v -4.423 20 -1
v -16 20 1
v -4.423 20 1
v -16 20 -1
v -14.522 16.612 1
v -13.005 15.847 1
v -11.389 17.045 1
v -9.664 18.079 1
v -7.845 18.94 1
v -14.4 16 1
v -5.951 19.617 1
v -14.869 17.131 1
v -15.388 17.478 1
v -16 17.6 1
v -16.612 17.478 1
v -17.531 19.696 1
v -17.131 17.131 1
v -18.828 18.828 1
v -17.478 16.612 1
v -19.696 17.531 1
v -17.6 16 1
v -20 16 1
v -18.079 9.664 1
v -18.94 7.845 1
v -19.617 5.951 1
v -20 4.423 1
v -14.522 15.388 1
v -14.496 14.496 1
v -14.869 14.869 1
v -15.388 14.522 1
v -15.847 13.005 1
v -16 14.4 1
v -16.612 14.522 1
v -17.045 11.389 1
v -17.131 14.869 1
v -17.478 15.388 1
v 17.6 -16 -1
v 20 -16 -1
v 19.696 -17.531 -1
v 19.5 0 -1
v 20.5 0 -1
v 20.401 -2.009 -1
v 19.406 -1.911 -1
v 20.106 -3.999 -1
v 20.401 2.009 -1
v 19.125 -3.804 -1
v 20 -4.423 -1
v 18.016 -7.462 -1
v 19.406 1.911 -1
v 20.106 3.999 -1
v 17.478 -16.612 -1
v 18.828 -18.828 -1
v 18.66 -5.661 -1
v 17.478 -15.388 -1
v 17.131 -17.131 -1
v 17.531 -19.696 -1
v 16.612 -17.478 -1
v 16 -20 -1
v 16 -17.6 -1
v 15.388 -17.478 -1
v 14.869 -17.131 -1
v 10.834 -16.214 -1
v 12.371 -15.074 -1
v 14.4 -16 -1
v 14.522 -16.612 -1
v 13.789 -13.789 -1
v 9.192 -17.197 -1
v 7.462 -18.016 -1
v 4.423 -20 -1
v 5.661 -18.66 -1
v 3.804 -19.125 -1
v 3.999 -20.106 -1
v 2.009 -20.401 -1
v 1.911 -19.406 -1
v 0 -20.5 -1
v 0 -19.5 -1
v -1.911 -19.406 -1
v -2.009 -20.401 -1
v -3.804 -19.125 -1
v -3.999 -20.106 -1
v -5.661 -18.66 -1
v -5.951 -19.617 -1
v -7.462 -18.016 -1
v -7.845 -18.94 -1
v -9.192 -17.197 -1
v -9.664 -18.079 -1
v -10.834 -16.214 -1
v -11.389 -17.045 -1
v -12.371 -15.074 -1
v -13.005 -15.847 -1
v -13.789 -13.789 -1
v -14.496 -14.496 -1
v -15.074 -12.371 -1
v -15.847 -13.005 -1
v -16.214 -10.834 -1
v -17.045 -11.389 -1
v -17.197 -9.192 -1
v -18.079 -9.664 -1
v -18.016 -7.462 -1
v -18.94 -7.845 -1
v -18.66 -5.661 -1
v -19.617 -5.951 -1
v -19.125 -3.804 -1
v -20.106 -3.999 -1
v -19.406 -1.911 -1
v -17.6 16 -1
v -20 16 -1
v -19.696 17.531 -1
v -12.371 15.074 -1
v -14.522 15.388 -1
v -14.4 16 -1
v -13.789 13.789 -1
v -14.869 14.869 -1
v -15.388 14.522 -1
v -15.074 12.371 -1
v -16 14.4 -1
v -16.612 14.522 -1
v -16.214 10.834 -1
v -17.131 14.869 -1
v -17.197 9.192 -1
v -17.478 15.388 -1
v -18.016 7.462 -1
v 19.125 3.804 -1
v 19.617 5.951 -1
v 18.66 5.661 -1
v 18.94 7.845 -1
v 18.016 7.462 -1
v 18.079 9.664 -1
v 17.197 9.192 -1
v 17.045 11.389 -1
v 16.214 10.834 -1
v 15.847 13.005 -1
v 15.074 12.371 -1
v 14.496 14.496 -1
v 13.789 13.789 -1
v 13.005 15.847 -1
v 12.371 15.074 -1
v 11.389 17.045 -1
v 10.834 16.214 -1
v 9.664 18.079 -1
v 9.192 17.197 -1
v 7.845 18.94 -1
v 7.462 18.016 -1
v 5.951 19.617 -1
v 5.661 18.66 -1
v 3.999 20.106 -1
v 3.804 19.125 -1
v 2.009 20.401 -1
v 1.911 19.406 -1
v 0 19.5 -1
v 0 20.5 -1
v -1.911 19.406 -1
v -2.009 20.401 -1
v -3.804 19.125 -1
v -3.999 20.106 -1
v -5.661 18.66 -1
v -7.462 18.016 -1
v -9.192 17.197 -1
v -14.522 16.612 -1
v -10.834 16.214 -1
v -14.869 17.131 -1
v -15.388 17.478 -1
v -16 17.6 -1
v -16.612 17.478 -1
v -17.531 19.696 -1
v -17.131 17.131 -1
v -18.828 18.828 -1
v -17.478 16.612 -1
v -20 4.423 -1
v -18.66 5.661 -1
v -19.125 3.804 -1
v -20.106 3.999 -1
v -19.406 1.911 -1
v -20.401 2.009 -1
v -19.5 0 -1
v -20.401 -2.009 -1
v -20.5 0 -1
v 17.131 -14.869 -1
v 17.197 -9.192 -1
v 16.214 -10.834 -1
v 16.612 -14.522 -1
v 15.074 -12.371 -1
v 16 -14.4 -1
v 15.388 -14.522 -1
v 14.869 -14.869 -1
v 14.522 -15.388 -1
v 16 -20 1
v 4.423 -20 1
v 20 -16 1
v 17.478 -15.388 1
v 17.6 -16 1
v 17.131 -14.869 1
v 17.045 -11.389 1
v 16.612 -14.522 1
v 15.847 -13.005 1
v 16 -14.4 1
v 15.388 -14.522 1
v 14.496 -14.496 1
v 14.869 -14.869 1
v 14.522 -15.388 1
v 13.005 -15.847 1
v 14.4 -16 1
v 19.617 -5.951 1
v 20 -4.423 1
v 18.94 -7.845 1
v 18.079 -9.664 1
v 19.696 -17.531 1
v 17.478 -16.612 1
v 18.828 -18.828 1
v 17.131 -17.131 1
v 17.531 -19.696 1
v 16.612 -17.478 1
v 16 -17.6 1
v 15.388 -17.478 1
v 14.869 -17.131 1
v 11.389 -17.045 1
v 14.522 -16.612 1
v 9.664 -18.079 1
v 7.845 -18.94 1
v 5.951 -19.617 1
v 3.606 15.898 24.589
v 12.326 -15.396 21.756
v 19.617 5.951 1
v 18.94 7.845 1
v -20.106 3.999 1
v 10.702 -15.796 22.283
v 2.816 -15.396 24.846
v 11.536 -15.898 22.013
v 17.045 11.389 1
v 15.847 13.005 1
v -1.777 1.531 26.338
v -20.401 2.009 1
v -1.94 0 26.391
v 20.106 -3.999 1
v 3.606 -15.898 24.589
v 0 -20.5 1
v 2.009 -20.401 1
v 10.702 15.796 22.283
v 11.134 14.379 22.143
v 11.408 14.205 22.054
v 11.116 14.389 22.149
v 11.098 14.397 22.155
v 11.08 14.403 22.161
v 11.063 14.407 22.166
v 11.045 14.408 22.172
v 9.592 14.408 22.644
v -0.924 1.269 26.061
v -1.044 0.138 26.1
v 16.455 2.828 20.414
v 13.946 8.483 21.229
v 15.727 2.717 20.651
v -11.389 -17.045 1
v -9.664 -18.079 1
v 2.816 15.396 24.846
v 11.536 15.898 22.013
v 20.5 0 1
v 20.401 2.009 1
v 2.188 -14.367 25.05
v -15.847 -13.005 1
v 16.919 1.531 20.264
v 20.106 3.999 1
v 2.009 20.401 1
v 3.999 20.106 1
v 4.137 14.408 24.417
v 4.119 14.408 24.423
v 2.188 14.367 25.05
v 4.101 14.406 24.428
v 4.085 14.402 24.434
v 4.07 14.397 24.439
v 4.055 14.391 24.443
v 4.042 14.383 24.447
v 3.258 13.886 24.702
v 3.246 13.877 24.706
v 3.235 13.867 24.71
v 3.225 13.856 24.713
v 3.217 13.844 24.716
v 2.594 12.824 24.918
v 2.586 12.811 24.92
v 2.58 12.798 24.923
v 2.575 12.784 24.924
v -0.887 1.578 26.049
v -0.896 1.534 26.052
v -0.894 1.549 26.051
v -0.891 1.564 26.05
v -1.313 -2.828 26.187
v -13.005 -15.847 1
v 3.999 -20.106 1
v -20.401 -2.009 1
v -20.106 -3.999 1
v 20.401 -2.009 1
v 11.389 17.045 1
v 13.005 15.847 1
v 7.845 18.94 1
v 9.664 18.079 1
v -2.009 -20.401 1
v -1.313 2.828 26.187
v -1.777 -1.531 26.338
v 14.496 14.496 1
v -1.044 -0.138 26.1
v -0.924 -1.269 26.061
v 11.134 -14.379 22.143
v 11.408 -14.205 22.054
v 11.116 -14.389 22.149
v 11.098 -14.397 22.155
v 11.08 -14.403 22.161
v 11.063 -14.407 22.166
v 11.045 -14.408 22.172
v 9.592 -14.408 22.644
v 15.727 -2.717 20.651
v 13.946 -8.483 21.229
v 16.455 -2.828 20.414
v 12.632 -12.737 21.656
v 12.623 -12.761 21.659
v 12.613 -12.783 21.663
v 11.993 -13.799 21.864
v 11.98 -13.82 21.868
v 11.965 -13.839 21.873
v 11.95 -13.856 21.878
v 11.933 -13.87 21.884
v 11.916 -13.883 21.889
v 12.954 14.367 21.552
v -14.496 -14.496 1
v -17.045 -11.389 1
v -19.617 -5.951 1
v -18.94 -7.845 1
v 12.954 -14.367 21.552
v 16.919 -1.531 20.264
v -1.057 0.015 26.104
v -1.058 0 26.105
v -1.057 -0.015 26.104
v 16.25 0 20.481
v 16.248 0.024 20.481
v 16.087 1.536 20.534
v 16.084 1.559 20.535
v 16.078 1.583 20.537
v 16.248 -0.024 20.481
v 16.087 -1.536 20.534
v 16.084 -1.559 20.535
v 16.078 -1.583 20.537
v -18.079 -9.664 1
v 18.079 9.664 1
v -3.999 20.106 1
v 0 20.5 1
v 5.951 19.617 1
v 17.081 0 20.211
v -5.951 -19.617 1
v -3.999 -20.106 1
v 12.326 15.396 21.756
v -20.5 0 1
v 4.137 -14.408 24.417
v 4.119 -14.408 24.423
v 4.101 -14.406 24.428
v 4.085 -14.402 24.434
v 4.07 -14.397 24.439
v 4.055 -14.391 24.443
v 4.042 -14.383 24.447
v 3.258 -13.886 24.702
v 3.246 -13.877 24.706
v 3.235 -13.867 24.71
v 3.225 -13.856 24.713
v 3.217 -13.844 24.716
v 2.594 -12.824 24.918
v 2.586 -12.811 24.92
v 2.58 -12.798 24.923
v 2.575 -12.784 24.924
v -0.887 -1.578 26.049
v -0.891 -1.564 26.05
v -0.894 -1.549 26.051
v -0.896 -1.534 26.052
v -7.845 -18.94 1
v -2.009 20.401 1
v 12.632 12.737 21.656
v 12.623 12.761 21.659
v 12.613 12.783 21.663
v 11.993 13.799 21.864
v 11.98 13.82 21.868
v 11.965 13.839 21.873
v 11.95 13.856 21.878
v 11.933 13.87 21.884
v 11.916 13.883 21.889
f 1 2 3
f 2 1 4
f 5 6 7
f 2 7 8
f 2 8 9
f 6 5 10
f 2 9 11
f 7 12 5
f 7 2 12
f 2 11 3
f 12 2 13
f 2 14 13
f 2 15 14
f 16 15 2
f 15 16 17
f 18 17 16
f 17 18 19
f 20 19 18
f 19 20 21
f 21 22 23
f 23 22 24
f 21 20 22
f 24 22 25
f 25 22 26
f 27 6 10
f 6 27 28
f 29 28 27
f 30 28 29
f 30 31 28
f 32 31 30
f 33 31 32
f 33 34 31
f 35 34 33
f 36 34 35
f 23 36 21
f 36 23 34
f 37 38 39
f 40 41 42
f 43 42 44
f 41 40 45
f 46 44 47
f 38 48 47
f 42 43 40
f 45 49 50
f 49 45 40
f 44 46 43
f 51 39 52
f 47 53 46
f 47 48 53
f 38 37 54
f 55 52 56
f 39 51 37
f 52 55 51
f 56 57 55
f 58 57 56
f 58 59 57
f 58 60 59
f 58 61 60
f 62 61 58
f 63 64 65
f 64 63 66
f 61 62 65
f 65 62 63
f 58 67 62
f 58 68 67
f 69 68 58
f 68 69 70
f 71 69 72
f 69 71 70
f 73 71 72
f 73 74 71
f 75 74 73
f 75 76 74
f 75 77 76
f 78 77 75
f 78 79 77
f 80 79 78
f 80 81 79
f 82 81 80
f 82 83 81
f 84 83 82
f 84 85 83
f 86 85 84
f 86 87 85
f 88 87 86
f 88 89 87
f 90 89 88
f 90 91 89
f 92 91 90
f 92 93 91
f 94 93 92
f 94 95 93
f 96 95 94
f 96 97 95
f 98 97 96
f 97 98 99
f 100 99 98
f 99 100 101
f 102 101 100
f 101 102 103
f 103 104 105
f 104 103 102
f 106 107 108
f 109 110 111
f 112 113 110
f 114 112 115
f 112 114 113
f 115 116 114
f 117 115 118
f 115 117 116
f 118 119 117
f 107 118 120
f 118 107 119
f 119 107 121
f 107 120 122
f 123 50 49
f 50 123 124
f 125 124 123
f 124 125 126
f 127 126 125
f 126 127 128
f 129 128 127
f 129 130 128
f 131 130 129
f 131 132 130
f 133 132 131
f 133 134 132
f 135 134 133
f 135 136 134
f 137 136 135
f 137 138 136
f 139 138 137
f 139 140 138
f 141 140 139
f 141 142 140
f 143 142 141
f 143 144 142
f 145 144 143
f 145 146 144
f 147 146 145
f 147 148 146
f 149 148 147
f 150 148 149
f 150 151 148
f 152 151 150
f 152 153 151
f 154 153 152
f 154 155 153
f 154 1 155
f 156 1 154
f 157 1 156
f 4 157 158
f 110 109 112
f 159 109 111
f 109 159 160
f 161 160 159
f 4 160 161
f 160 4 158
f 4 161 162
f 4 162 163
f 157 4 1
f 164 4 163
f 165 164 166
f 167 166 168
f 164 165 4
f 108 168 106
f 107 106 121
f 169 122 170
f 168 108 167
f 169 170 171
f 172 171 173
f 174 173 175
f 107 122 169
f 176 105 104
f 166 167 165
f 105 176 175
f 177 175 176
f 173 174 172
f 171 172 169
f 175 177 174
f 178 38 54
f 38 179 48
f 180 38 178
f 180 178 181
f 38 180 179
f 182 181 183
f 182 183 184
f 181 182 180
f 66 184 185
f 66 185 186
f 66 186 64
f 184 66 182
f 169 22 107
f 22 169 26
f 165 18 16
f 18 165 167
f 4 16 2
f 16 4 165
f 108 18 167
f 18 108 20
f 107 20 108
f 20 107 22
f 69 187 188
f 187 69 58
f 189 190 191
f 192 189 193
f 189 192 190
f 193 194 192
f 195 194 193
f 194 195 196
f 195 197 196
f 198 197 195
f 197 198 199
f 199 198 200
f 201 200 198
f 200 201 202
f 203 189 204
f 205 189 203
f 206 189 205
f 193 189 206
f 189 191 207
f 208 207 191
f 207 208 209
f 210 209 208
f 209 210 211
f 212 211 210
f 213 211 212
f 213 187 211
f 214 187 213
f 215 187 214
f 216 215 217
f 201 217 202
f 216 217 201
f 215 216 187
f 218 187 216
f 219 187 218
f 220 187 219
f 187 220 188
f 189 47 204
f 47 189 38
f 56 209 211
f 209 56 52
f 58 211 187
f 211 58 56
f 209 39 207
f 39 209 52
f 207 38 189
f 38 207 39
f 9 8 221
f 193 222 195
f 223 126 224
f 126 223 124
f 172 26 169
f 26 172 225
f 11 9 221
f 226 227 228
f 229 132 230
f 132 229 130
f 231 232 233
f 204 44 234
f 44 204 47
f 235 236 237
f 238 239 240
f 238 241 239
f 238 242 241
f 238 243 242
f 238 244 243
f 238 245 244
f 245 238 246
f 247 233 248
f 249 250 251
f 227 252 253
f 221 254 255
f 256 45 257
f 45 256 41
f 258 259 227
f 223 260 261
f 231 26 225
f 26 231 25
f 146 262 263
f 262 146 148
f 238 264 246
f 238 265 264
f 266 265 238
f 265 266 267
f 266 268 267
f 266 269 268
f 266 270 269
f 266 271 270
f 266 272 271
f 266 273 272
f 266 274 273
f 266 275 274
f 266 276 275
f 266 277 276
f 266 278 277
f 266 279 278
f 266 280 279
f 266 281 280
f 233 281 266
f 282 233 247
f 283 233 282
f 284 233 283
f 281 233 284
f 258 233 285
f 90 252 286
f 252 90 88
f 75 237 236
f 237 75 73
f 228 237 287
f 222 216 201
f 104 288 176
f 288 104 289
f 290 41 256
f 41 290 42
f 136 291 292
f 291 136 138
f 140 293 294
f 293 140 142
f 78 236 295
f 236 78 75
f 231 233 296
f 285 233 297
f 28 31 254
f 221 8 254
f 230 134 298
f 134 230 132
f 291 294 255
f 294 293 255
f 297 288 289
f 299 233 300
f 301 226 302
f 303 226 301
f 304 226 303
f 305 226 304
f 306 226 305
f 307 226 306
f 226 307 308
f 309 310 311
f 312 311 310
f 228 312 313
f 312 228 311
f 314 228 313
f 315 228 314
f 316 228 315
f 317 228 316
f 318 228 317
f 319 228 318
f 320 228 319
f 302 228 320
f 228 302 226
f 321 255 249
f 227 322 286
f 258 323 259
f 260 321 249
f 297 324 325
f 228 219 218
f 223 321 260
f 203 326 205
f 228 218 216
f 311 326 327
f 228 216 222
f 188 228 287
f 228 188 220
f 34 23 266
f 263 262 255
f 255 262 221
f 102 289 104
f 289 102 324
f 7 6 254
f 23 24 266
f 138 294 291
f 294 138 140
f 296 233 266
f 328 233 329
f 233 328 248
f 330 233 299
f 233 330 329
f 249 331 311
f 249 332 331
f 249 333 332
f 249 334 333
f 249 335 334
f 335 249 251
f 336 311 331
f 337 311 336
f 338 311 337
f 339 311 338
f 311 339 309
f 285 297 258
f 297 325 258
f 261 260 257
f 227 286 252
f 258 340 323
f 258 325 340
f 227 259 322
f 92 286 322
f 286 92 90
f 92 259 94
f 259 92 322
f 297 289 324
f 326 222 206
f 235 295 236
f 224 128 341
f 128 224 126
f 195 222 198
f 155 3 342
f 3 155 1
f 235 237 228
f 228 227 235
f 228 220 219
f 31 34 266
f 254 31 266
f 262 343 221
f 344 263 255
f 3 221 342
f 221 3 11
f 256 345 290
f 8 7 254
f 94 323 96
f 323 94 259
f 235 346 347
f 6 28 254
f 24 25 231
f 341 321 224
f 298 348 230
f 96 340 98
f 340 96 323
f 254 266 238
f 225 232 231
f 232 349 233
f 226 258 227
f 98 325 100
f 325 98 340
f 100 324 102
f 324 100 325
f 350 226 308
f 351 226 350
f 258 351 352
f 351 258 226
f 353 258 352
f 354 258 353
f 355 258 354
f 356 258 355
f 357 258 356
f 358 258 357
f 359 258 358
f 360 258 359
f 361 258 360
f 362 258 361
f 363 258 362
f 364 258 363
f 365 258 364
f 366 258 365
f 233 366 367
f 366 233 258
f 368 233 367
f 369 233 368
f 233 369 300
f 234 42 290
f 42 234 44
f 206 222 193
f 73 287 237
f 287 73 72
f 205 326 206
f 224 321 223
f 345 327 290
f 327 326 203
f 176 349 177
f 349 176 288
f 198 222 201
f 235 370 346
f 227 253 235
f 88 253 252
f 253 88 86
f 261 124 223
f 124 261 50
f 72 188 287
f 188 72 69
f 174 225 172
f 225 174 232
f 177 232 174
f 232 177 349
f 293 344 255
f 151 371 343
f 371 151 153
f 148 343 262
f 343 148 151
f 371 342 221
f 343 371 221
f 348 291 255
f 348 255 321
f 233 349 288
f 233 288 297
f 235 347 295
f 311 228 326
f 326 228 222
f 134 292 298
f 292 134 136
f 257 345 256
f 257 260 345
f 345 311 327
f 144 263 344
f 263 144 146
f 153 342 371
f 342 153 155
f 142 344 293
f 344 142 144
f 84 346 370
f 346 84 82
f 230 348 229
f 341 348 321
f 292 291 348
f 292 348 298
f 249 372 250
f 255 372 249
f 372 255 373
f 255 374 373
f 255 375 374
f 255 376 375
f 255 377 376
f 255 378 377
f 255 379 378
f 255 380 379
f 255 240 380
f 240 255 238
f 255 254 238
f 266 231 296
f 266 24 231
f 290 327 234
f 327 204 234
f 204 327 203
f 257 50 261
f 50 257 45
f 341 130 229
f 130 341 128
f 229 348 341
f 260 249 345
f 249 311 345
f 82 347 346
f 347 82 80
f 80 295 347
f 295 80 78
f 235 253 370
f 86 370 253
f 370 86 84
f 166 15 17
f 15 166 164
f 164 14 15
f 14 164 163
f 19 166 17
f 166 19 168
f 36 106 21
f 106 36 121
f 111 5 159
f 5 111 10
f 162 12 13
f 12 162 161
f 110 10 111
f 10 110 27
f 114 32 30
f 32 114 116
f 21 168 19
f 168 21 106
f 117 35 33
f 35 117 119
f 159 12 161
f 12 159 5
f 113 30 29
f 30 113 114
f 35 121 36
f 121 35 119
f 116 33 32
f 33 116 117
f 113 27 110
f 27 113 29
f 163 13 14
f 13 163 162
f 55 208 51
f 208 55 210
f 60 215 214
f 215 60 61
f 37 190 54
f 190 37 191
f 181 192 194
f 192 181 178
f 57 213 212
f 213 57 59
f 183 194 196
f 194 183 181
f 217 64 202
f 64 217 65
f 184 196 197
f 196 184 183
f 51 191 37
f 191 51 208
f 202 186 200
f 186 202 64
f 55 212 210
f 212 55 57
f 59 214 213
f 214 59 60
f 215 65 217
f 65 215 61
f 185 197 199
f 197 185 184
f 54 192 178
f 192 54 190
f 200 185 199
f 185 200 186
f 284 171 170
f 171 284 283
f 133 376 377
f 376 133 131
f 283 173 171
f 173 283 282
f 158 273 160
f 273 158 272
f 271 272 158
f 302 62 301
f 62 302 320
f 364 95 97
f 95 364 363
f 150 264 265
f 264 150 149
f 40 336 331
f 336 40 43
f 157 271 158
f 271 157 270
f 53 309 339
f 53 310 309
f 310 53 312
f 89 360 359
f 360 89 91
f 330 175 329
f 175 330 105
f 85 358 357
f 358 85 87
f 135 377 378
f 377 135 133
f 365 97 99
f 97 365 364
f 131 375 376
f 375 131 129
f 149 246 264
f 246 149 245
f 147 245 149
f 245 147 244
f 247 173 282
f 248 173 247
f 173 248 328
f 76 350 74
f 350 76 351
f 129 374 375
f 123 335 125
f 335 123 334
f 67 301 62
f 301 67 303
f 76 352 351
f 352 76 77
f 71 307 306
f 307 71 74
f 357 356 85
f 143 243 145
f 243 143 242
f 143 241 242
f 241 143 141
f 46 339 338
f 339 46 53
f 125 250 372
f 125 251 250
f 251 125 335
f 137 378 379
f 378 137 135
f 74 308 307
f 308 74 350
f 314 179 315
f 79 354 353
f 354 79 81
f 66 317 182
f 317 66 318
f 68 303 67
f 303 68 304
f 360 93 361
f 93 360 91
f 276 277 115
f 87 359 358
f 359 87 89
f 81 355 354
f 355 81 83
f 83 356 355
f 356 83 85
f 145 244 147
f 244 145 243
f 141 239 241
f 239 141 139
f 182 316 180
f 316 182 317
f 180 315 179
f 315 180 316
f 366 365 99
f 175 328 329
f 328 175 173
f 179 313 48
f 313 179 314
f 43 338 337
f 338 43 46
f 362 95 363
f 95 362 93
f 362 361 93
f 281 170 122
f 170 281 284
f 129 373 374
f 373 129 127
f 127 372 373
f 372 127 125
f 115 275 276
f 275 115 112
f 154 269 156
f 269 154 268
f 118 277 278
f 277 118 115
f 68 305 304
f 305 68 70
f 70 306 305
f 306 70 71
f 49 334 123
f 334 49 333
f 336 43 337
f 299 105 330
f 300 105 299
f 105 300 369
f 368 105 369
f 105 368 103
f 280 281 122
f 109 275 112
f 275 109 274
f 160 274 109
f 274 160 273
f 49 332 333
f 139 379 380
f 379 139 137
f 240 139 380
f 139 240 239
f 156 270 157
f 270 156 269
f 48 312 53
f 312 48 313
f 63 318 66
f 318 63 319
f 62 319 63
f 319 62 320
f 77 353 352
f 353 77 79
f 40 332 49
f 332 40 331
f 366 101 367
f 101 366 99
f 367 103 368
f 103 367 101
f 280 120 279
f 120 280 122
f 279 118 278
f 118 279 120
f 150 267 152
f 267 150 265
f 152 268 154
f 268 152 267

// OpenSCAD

nozzle_edges = 6;
nozzle_edgeradius = 3;
nozzle_edgerotate = false;
nozzle_length = 24;
nozzle_dillation = 24;
nozzle_wall = 1;
nozzle_scale = 0.75;
nozzle_tilt = 18;

mntholes_numberof = 2;
mntholes_angles = [ 90, 270, 0, 180 ];

$fn = 64;

module nozzle_shape( r, h )
{
	if ( nozzle_edges < 20 && nozzle_edgeradius > 0 )
		for ( a = [0:nozzle_edges] )
			rotate( [ 0, 0, 360/nozzle_edges * a ] )
				translate( [ r- nozzle_edgeradius, 0, 0 ] )
					cylinder( r = nozzle_edgeradius, h = h, center = true, $fn = 16 );
	else
		cylinder( r = r, h = h, center = true, $fn = nozzle_edges );
}

difference()
{
	union()
	{
		for ( a = [1:mntholes_numberof] )
			rotate( [ 0, 0, mntholes_angles[a-1] ] )
			{
				translate( [ 10, 8, 0 ] )
					cube( [ 20, 16, 2 ], center = true );
				translate( [ 8, 10, 0 ] )
					cube( [ 16, 20, 2 ], center = true );
				translate( [ 16, 16, 0 ] )
					cylinder( r = 4, h = 2, center = true, $fn = 16 );
			}

		hull()
		{
			cylinder( r = 20.5, h = 2, center = true );
			rotate( [ 0, nozzle_tilt, 0 ] )
			translate( [ 0, 0, nozzle_length ] )
				scale( [ nozzle_scale, 1 / nozzle_scale, 1 ] )
					rotate( [ 0, 0, nozzle_edgerotate ? 180 / nozzle_edges : 0 ] )
						nozzle_shape( r = nozzle_dillation/2+nozzle_wall*max(nozzle_scale,1/nozzle_scale), h = 1 );
		}
	}

	for ( a = [1:mntholes_numberof] )
		rotate( [ 0, 0, mntholes_angles[a-1] ] )
			translate( [ 16, 16, 0 ] )
				cylinder( r = 1.6, h = 5, center = true, $fn = 16 );

	hull()
	{
		translate( [ 0, 0, -1.5 ] )
		cylinder( r = 20.5 - nozzle_wall, h = 1, center = true );
			rotate( [ 0, nozzle_tilt, 0 ] )
		translate( [ 0, 0, nozzle_length ] )
			//cylinder( r = nozzle_dillation * cos( 180 / nozzle_edges )/2, h = 1.5, center = true );
			scale( [ nozzle_scale, 1 / nozzle_scale, 1 ] )
				rotate( [ 0, 0, nozzle_edgerotate ? 180 / nozzle_edges : 0 ] )
					nozzle_shape( r = nozzle_dillation/2, h = 1.5 );
	}
}

